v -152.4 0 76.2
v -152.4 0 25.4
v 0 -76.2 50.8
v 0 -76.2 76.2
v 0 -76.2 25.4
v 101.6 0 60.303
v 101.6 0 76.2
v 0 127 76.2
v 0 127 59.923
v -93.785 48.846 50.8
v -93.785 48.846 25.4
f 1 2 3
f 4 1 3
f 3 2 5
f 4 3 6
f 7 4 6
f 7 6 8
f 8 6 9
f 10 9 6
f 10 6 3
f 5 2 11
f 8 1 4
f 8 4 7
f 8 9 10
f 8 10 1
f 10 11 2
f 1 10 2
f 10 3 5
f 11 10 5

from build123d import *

# Parameters (mm, degrees)
F2_DEPTH = 50.8
F4_DEPTH = 254.001


with BuildPart() as f2:
    # F1 (on offset) → F2 (new body)
    with BuildSketch(Plane.XY.offset(25.4)):
        Polygon((0, 127), (-152.4, 0), (0, -76.2), (101.6, 0), align=None)
    extrude(amount=F2_DEPTH)

    # F3 (on face) → F4 (cut, through all)
    with BuildSketch(Plane(origin=(36.576, -48.768, 0), x_dir=(0.8, 0.6, 0), z_dir=(0.6, -0.8, 0))):
        Polygon((-45.72, 25.4), (294.287443, 25.4), (293.713361, 76.2), (-45.72, 50.8), align=None)
    extrude(amount=-F4_DEPTH, mode=Mode.SUBTRACT)


solid = f2.part
